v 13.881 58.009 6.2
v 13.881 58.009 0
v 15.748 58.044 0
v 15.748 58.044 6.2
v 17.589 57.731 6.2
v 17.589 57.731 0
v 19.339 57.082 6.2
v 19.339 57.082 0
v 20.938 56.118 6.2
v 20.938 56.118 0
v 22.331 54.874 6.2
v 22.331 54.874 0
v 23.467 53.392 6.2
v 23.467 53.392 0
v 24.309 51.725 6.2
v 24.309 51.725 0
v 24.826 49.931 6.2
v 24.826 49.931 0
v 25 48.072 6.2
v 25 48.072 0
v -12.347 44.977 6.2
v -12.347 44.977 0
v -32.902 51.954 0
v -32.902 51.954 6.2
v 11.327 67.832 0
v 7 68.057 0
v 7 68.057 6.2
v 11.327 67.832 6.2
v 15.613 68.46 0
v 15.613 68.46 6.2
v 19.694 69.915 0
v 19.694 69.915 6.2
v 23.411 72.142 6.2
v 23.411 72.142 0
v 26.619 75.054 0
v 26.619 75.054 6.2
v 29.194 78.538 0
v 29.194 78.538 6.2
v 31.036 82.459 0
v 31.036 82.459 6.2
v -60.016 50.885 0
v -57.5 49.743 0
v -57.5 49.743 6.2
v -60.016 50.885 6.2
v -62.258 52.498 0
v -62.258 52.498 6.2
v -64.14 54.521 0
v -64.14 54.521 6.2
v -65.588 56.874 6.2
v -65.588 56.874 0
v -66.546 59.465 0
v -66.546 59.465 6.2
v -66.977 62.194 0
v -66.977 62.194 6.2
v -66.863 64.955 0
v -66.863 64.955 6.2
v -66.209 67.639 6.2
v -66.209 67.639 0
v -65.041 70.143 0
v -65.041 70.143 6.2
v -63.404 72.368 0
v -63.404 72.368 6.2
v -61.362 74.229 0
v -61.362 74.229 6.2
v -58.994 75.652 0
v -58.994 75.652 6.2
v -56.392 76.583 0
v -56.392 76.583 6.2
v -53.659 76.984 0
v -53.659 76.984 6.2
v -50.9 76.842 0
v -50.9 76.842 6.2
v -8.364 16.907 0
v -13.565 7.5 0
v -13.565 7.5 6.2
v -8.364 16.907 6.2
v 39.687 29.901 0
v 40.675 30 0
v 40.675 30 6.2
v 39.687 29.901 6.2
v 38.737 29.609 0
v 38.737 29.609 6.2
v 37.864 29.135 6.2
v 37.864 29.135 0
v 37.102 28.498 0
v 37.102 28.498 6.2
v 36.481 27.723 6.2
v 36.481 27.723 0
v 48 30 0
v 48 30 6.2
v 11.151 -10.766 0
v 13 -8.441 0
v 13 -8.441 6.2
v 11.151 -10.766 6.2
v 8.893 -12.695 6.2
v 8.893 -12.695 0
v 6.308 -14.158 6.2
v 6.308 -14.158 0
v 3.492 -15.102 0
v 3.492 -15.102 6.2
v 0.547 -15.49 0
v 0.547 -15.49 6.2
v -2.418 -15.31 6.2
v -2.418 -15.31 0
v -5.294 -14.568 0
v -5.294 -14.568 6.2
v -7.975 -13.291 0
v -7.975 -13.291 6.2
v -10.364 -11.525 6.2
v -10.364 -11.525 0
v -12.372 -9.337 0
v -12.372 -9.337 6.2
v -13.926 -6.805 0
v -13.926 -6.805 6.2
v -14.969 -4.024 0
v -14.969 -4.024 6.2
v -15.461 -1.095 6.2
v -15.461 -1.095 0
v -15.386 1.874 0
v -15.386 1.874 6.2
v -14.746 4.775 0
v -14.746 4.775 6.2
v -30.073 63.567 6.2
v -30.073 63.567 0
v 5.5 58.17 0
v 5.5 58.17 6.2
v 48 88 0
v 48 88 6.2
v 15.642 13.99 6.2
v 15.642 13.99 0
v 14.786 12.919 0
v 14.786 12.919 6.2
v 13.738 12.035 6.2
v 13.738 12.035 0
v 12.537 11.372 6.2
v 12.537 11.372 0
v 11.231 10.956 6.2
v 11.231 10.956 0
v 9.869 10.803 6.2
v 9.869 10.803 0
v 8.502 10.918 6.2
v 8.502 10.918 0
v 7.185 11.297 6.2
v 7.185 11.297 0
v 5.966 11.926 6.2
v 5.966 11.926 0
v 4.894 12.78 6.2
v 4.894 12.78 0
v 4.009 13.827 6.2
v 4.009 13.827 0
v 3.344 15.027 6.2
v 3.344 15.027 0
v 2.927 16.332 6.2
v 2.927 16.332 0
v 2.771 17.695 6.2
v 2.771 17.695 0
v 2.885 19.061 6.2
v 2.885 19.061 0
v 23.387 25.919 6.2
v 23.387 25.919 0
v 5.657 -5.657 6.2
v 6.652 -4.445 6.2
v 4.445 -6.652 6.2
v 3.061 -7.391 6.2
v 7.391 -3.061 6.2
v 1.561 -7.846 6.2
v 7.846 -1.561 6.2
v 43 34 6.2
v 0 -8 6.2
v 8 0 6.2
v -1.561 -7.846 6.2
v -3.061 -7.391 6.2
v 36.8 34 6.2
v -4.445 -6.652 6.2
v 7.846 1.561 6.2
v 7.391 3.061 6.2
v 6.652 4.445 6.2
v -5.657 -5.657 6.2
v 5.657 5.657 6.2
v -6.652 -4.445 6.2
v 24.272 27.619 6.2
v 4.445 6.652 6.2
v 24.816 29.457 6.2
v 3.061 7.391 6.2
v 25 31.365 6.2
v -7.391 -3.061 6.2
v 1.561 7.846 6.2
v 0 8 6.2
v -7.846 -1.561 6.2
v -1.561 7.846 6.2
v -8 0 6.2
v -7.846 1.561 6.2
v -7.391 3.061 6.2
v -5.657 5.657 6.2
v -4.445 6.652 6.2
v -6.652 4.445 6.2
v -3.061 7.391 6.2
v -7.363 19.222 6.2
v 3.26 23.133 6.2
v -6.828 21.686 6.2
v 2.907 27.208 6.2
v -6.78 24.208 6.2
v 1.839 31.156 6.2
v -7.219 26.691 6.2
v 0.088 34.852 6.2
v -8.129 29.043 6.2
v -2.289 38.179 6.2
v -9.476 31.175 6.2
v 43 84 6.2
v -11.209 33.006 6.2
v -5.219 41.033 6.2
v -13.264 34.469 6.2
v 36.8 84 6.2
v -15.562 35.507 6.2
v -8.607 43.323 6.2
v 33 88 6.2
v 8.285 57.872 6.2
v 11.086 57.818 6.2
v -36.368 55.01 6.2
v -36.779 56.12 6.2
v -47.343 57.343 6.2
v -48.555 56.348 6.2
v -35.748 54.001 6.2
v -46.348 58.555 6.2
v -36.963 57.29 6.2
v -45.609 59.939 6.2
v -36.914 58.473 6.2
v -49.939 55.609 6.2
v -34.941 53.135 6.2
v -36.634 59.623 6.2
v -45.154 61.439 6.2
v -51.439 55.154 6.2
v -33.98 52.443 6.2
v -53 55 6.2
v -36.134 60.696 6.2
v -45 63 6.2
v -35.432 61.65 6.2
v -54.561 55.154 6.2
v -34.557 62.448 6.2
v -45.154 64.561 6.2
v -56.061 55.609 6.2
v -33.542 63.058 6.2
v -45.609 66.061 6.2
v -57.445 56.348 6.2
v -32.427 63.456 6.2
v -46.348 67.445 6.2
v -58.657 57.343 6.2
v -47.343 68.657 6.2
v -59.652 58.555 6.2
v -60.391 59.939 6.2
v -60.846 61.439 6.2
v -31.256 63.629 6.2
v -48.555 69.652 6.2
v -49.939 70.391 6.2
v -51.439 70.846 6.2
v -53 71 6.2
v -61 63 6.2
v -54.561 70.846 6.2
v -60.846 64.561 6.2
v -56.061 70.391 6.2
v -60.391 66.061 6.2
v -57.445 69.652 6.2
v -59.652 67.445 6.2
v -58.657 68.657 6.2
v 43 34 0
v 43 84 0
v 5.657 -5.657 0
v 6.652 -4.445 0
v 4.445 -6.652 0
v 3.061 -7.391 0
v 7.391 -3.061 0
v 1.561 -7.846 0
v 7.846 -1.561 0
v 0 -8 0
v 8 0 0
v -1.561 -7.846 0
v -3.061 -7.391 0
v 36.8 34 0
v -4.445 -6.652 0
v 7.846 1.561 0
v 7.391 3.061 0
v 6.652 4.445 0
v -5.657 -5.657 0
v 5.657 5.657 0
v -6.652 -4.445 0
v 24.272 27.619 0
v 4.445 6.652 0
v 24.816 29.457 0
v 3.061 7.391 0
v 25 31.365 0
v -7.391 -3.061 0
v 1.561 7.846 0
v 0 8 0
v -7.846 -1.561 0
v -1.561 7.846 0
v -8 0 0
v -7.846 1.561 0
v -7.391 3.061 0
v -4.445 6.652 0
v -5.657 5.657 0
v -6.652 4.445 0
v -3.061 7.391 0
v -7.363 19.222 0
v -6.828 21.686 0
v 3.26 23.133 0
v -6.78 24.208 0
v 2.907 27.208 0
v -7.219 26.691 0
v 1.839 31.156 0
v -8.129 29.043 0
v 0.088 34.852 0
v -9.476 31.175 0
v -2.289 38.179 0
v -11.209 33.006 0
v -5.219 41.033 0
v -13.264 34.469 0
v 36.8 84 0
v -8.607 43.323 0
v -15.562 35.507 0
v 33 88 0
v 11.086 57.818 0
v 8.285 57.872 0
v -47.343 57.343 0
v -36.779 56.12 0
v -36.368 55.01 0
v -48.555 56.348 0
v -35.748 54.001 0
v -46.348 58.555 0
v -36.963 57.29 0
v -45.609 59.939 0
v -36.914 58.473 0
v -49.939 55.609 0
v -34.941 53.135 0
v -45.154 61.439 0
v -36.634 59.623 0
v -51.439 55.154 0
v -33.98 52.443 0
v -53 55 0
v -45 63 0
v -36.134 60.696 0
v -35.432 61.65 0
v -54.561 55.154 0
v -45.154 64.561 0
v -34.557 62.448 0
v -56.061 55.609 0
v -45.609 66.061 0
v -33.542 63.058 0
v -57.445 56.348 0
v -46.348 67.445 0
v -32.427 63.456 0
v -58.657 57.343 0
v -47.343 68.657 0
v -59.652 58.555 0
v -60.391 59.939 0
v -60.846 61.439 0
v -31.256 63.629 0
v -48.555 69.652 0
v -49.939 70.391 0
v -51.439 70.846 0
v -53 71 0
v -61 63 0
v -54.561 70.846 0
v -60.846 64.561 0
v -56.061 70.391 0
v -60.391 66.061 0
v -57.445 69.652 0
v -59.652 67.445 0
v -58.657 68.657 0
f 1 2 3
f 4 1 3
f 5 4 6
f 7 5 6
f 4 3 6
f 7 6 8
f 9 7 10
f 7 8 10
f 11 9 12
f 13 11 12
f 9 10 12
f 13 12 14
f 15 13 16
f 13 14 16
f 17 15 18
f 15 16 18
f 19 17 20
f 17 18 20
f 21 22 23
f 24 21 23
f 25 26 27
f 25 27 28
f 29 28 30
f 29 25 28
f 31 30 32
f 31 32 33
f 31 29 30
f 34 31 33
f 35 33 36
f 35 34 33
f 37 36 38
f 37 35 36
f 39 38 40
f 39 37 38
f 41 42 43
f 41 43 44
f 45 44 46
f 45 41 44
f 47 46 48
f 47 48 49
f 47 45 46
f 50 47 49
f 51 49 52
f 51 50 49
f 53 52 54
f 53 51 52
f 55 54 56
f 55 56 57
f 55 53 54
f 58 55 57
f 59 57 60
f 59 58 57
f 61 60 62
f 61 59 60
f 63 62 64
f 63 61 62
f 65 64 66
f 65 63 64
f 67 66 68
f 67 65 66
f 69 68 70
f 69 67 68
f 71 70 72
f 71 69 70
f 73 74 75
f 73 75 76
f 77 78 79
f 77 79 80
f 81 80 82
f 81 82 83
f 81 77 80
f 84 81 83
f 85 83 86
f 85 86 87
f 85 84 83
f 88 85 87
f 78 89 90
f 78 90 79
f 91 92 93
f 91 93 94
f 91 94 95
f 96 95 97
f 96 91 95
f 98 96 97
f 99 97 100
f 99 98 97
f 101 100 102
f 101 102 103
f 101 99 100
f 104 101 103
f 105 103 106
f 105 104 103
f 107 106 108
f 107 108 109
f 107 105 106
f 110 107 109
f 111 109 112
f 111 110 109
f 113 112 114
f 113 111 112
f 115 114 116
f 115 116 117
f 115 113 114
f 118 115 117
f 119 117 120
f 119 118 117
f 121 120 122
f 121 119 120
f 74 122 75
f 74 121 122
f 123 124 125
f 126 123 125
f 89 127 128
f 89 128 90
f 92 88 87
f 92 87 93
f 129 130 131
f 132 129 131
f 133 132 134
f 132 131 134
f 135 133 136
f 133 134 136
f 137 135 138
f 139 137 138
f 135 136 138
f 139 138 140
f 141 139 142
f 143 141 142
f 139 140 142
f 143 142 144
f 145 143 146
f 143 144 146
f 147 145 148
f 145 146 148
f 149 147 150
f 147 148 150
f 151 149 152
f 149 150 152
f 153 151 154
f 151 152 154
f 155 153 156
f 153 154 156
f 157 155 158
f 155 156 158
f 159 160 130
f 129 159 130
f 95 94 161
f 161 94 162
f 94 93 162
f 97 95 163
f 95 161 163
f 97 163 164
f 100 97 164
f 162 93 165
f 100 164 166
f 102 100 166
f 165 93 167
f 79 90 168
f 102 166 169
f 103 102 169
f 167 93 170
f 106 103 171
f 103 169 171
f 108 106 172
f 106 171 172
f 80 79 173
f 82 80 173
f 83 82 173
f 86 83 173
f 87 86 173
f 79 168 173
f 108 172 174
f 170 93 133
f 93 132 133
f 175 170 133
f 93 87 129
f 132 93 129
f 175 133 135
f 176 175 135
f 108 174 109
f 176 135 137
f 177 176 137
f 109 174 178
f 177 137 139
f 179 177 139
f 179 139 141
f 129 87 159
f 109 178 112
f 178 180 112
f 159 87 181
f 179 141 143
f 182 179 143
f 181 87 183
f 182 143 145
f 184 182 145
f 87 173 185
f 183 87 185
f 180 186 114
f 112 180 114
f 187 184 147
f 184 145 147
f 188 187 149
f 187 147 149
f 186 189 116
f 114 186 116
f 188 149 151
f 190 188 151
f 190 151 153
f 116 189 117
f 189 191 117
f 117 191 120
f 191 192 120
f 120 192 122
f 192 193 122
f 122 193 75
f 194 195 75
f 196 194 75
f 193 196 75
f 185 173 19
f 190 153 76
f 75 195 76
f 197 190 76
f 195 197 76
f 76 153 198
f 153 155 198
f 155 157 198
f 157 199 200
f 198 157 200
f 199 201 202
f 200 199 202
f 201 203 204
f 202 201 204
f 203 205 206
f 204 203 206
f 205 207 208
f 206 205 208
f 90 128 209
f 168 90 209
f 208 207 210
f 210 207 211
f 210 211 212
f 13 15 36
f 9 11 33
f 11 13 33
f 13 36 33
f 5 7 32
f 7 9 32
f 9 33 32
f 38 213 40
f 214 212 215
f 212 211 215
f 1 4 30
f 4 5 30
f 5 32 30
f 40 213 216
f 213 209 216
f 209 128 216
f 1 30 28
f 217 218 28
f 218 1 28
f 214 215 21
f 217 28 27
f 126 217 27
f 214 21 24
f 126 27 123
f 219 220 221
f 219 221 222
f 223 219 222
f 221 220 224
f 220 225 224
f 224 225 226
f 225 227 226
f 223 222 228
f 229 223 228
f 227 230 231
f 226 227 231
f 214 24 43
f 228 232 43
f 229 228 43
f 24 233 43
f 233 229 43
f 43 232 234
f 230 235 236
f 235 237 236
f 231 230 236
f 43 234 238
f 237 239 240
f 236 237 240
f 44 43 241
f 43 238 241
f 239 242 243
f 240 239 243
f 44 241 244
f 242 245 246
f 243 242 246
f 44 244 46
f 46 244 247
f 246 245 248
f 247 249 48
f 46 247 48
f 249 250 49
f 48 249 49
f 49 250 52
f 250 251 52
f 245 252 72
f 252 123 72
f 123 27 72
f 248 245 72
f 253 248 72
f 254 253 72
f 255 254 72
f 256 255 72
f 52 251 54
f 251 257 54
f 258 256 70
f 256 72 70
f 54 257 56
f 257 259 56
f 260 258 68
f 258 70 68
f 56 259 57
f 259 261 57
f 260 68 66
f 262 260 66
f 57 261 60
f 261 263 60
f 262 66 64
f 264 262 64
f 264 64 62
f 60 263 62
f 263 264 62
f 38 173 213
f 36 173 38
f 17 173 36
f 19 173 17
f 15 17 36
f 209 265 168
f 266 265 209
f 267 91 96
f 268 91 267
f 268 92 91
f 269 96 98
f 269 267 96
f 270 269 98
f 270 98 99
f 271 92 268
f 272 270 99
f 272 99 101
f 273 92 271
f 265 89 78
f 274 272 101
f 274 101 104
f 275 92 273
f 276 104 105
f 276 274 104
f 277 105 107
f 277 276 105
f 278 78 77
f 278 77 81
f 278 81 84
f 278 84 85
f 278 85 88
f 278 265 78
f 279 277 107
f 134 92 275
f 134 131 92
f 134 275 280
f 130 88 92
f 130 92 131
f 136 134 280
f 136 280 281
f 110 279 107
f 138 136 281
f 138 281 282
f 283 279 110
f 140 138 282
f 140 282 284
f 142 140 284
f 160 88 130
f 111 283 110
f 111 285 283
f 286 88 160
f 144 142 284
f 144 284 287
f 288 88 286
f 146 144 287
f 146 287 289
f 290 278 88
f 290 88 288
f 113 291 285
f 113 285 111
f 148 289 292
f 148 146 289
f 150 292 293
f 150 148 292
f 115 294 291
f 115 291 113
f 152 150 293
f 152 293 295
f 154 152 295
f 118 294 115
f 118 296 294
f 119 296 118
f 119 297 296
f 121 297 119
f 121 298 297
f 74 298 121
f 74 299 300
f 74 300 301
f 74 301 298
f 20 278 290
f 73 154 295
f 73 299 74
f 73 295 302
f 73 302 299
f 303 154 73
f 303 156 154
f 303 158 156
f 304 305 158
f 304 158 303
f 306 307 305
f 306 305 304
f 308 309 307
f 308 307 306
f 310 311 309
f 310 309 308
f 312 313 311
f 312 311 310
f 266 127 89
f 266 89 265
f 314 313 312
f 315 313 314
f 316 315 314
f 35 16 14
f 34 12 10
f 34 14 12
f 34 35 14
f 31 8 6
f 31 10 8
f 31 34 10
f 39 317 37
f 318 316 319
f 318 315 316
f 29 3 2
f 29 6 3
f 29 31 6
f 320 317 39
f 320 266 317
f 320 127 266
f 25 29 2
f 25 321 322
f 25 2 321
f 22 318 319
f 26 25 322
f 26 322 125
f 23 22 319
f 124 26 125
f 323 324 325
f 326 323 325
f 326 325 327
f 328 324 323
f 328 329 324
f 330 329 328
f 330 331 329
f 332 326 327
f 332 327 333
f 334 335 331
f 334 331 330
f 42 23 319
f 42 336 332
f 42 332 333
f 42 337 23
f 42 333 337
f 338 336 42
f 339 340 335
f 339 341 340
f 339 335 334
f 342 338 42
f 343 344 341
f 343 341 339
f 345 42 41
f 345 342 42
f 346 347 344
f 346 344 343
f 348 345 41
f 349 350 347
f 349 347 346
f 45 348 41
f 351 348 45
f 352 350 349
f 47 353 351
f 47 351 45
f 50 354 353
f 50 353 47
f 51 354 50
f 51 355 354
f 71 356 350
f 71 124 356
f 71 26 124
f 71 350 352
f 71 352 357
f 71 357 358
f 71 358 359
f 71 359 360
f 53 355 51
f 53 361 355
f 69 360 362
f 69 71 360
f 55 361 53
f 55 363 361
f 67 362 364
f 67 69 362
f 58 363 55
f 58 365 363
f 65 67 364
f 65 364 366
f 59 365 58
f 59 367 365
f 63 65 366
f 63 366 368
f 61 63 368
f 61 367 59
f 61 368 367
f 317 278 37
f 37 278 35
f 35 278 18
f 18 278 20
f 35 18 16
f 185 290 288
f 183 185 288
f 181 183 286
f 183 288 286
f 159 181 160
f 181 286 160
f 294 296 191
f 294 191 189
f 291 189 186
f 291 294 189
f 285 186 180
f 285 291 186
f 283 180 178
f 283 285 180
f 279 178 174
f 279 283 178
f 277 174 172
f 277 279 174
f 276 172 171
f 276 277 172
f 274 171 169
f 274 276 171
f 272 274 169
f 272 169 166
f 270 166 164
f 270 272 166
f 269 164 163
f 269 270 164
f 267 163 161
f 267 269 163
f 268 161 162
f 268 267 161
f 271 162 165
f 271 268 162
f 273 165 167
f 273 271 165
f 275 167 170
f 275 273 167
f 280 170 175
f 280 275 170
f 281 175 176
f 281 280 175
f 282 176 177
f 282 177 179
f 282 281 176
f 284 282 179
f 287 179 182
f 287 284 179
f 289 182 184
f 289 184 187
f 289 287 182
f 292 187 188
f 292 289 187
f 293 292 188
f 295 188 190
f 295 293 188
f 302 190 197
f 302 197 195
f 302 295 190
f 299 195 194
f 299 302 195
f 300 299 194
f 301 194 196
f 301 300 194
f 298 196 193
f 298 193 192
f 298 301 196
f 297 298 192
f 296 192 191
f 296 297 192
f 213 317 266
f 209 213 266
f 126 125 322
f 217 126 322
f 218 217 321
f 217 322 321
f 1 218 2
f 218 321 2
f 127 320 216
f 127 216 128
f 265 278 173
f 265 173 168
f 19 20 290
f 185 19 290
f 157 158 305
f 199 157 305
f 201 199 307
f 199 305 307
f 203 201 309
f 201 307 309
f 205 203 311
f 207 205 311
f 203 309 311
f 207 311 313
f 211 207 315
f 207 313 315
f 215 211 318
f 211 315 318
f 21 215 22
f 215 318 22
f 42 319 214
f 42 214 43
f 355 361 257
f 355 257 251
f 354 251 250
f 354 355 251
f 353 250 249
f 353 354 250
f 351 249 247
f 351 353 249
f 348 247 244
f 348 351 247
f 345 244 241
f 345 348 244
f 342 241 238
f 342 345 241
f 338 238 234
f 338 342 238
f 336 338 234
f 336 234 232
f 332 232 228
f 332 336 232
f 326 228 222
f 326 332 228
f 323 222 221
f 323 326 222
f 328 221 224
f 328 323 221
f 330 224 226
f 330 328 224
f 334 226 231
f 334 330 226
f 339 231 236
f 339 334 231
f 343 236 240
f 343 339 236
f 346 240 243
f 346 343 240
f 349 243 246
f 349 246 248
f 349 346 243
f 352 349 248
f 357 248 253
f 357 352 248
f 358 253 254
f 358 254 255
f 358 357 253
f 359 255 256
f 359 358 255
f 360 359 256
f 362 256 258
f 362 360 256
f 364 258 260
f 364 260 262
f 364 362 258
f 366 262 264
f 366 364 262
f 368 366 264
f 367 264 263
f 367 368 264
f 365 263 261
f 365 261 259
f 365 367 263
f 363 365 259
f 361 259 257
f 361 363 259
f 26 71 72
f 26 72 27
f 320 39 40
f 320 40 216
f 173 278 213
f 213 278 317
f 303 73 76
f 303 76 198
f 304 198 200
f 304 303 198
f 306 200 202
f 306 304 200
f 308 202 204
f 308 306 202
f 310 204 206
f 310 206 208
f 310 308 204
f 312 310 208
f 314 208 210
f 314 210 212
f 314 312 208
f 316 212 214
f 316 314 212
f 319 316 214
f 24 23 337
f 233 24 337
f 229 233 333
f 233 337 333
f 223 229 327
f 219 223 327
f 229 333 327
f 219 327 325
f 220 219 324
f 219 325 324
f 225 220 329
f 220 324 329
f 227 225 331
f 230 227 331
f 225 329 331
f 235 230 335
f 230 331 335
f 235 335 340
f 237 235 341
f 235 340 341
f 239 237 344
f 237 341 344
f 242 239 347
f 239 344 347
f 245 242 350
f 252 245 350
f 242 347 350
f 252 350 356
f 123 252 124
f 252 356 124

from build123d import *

# Parameters (mm, degrees)
SKETCH1_R           = 8
SKETCH1_W           = 6.2
SKETCH1_H           = 50
BOSS_EXTRUDE1_DEPTH = 6.2


with BuildPart() as part:
    # Sketch1 → Boss-Extrude1 (new body)
    with BuildSketch(Plane.XY):
        with BuildLine():
            Line((31.036127447, 82.458954329), (33, 88))
            Line((33, 88), (48, 88))
            Line((48, 88), (48, 30))
            Line((48, 30), (40.674945208, 30))
            ThreePointArc((40.674945208, 30), (38.288993634, 29.393999896), (36.481396821, 27.722894035))
            Line((36.481396821, 27.722894035), (13, -8.440971508))
            ThreePointArc((13, -8.440971508), (-7.975484523, -13.290660128), (-13.564659966, 7.5))
            Line((-13.564659966, 7.5), (-8.363522167, 16.906888758))
            ThreePointArc((-8.363522167, 16.906888758), (-7.61652309, 27.889035615), (-15.561762323, 35.507351095))
            Line((-15.561762323, 35.507351095), (-57.5, 49.742926416))
            ThreePointArc((-57.5, 49.742926416), (-66.602374097, 66.312916983), (-50.9, 76.841603953))
            Line((-50.9, 76.841603953), (7, 68.057217374))
            ThreePointArc((7, 68.057217374), (21.607393242, 70.936561685), (31.036127447, 82.458954329))
        make_face()
        with Locations(Location((-53, 63, 0), (0, 0, 180))):
            Circle(SKETCH1_R, mode=Mode.SUBTRACT)
        with Locations(Location((0, 0, 0), (0, 0, 180))):
            Circle(SKETCH1_R, mode=Mode.SUBTRACT)
        with Locations((39.9, 59)):
            Rectangle(SKETCH1_W, SKETCH1_H, mode=Mode.SUBTRACT)
        with BuildLine():
            Line((-30.073264159, 63.567409295), (5.5, 58.170357408))
            ThreePointArc((5.5, 58.170357408), (9.685179801, 57.814216157), (13.880952381, 58.009303341))
            ThreePointArc((13.880952381, 58.009303341), (21.663689812, 55.528335414), (25, 48.072113978))
            Line((25, 48.072113978), (25, 31.364873077))
            ThreePointArc((25, 31.364873077), (24.588299321, 28.525063906), (23.387096774, 25.919085008))
            Line((23.387096774, 25.919085008), (15.641533812, 13.990088635))
            ThreePointArc((15.641533812, 13.990088635), (7.184832002, 11.297220659), (2.884689445, 19.060990196))
            ThreePointArc((2.884689445, 19.060990196), (0.088285739, 34.851646077), (-12.347476609, 44.976689369))
            Line((-12.347476609, 44.976689369), (-32.901835588, 51.95369035))
            ThreePointArc((-32.901835588, 51.95369035), (-36.802853058, 59.055114879), (-30.073264159, 63.567409295))
        make_face(mode=Mode.SUBTRACT)
    extrude(amount=BOSS_EXTRUDE1_DEPTH)


solid = part.part
